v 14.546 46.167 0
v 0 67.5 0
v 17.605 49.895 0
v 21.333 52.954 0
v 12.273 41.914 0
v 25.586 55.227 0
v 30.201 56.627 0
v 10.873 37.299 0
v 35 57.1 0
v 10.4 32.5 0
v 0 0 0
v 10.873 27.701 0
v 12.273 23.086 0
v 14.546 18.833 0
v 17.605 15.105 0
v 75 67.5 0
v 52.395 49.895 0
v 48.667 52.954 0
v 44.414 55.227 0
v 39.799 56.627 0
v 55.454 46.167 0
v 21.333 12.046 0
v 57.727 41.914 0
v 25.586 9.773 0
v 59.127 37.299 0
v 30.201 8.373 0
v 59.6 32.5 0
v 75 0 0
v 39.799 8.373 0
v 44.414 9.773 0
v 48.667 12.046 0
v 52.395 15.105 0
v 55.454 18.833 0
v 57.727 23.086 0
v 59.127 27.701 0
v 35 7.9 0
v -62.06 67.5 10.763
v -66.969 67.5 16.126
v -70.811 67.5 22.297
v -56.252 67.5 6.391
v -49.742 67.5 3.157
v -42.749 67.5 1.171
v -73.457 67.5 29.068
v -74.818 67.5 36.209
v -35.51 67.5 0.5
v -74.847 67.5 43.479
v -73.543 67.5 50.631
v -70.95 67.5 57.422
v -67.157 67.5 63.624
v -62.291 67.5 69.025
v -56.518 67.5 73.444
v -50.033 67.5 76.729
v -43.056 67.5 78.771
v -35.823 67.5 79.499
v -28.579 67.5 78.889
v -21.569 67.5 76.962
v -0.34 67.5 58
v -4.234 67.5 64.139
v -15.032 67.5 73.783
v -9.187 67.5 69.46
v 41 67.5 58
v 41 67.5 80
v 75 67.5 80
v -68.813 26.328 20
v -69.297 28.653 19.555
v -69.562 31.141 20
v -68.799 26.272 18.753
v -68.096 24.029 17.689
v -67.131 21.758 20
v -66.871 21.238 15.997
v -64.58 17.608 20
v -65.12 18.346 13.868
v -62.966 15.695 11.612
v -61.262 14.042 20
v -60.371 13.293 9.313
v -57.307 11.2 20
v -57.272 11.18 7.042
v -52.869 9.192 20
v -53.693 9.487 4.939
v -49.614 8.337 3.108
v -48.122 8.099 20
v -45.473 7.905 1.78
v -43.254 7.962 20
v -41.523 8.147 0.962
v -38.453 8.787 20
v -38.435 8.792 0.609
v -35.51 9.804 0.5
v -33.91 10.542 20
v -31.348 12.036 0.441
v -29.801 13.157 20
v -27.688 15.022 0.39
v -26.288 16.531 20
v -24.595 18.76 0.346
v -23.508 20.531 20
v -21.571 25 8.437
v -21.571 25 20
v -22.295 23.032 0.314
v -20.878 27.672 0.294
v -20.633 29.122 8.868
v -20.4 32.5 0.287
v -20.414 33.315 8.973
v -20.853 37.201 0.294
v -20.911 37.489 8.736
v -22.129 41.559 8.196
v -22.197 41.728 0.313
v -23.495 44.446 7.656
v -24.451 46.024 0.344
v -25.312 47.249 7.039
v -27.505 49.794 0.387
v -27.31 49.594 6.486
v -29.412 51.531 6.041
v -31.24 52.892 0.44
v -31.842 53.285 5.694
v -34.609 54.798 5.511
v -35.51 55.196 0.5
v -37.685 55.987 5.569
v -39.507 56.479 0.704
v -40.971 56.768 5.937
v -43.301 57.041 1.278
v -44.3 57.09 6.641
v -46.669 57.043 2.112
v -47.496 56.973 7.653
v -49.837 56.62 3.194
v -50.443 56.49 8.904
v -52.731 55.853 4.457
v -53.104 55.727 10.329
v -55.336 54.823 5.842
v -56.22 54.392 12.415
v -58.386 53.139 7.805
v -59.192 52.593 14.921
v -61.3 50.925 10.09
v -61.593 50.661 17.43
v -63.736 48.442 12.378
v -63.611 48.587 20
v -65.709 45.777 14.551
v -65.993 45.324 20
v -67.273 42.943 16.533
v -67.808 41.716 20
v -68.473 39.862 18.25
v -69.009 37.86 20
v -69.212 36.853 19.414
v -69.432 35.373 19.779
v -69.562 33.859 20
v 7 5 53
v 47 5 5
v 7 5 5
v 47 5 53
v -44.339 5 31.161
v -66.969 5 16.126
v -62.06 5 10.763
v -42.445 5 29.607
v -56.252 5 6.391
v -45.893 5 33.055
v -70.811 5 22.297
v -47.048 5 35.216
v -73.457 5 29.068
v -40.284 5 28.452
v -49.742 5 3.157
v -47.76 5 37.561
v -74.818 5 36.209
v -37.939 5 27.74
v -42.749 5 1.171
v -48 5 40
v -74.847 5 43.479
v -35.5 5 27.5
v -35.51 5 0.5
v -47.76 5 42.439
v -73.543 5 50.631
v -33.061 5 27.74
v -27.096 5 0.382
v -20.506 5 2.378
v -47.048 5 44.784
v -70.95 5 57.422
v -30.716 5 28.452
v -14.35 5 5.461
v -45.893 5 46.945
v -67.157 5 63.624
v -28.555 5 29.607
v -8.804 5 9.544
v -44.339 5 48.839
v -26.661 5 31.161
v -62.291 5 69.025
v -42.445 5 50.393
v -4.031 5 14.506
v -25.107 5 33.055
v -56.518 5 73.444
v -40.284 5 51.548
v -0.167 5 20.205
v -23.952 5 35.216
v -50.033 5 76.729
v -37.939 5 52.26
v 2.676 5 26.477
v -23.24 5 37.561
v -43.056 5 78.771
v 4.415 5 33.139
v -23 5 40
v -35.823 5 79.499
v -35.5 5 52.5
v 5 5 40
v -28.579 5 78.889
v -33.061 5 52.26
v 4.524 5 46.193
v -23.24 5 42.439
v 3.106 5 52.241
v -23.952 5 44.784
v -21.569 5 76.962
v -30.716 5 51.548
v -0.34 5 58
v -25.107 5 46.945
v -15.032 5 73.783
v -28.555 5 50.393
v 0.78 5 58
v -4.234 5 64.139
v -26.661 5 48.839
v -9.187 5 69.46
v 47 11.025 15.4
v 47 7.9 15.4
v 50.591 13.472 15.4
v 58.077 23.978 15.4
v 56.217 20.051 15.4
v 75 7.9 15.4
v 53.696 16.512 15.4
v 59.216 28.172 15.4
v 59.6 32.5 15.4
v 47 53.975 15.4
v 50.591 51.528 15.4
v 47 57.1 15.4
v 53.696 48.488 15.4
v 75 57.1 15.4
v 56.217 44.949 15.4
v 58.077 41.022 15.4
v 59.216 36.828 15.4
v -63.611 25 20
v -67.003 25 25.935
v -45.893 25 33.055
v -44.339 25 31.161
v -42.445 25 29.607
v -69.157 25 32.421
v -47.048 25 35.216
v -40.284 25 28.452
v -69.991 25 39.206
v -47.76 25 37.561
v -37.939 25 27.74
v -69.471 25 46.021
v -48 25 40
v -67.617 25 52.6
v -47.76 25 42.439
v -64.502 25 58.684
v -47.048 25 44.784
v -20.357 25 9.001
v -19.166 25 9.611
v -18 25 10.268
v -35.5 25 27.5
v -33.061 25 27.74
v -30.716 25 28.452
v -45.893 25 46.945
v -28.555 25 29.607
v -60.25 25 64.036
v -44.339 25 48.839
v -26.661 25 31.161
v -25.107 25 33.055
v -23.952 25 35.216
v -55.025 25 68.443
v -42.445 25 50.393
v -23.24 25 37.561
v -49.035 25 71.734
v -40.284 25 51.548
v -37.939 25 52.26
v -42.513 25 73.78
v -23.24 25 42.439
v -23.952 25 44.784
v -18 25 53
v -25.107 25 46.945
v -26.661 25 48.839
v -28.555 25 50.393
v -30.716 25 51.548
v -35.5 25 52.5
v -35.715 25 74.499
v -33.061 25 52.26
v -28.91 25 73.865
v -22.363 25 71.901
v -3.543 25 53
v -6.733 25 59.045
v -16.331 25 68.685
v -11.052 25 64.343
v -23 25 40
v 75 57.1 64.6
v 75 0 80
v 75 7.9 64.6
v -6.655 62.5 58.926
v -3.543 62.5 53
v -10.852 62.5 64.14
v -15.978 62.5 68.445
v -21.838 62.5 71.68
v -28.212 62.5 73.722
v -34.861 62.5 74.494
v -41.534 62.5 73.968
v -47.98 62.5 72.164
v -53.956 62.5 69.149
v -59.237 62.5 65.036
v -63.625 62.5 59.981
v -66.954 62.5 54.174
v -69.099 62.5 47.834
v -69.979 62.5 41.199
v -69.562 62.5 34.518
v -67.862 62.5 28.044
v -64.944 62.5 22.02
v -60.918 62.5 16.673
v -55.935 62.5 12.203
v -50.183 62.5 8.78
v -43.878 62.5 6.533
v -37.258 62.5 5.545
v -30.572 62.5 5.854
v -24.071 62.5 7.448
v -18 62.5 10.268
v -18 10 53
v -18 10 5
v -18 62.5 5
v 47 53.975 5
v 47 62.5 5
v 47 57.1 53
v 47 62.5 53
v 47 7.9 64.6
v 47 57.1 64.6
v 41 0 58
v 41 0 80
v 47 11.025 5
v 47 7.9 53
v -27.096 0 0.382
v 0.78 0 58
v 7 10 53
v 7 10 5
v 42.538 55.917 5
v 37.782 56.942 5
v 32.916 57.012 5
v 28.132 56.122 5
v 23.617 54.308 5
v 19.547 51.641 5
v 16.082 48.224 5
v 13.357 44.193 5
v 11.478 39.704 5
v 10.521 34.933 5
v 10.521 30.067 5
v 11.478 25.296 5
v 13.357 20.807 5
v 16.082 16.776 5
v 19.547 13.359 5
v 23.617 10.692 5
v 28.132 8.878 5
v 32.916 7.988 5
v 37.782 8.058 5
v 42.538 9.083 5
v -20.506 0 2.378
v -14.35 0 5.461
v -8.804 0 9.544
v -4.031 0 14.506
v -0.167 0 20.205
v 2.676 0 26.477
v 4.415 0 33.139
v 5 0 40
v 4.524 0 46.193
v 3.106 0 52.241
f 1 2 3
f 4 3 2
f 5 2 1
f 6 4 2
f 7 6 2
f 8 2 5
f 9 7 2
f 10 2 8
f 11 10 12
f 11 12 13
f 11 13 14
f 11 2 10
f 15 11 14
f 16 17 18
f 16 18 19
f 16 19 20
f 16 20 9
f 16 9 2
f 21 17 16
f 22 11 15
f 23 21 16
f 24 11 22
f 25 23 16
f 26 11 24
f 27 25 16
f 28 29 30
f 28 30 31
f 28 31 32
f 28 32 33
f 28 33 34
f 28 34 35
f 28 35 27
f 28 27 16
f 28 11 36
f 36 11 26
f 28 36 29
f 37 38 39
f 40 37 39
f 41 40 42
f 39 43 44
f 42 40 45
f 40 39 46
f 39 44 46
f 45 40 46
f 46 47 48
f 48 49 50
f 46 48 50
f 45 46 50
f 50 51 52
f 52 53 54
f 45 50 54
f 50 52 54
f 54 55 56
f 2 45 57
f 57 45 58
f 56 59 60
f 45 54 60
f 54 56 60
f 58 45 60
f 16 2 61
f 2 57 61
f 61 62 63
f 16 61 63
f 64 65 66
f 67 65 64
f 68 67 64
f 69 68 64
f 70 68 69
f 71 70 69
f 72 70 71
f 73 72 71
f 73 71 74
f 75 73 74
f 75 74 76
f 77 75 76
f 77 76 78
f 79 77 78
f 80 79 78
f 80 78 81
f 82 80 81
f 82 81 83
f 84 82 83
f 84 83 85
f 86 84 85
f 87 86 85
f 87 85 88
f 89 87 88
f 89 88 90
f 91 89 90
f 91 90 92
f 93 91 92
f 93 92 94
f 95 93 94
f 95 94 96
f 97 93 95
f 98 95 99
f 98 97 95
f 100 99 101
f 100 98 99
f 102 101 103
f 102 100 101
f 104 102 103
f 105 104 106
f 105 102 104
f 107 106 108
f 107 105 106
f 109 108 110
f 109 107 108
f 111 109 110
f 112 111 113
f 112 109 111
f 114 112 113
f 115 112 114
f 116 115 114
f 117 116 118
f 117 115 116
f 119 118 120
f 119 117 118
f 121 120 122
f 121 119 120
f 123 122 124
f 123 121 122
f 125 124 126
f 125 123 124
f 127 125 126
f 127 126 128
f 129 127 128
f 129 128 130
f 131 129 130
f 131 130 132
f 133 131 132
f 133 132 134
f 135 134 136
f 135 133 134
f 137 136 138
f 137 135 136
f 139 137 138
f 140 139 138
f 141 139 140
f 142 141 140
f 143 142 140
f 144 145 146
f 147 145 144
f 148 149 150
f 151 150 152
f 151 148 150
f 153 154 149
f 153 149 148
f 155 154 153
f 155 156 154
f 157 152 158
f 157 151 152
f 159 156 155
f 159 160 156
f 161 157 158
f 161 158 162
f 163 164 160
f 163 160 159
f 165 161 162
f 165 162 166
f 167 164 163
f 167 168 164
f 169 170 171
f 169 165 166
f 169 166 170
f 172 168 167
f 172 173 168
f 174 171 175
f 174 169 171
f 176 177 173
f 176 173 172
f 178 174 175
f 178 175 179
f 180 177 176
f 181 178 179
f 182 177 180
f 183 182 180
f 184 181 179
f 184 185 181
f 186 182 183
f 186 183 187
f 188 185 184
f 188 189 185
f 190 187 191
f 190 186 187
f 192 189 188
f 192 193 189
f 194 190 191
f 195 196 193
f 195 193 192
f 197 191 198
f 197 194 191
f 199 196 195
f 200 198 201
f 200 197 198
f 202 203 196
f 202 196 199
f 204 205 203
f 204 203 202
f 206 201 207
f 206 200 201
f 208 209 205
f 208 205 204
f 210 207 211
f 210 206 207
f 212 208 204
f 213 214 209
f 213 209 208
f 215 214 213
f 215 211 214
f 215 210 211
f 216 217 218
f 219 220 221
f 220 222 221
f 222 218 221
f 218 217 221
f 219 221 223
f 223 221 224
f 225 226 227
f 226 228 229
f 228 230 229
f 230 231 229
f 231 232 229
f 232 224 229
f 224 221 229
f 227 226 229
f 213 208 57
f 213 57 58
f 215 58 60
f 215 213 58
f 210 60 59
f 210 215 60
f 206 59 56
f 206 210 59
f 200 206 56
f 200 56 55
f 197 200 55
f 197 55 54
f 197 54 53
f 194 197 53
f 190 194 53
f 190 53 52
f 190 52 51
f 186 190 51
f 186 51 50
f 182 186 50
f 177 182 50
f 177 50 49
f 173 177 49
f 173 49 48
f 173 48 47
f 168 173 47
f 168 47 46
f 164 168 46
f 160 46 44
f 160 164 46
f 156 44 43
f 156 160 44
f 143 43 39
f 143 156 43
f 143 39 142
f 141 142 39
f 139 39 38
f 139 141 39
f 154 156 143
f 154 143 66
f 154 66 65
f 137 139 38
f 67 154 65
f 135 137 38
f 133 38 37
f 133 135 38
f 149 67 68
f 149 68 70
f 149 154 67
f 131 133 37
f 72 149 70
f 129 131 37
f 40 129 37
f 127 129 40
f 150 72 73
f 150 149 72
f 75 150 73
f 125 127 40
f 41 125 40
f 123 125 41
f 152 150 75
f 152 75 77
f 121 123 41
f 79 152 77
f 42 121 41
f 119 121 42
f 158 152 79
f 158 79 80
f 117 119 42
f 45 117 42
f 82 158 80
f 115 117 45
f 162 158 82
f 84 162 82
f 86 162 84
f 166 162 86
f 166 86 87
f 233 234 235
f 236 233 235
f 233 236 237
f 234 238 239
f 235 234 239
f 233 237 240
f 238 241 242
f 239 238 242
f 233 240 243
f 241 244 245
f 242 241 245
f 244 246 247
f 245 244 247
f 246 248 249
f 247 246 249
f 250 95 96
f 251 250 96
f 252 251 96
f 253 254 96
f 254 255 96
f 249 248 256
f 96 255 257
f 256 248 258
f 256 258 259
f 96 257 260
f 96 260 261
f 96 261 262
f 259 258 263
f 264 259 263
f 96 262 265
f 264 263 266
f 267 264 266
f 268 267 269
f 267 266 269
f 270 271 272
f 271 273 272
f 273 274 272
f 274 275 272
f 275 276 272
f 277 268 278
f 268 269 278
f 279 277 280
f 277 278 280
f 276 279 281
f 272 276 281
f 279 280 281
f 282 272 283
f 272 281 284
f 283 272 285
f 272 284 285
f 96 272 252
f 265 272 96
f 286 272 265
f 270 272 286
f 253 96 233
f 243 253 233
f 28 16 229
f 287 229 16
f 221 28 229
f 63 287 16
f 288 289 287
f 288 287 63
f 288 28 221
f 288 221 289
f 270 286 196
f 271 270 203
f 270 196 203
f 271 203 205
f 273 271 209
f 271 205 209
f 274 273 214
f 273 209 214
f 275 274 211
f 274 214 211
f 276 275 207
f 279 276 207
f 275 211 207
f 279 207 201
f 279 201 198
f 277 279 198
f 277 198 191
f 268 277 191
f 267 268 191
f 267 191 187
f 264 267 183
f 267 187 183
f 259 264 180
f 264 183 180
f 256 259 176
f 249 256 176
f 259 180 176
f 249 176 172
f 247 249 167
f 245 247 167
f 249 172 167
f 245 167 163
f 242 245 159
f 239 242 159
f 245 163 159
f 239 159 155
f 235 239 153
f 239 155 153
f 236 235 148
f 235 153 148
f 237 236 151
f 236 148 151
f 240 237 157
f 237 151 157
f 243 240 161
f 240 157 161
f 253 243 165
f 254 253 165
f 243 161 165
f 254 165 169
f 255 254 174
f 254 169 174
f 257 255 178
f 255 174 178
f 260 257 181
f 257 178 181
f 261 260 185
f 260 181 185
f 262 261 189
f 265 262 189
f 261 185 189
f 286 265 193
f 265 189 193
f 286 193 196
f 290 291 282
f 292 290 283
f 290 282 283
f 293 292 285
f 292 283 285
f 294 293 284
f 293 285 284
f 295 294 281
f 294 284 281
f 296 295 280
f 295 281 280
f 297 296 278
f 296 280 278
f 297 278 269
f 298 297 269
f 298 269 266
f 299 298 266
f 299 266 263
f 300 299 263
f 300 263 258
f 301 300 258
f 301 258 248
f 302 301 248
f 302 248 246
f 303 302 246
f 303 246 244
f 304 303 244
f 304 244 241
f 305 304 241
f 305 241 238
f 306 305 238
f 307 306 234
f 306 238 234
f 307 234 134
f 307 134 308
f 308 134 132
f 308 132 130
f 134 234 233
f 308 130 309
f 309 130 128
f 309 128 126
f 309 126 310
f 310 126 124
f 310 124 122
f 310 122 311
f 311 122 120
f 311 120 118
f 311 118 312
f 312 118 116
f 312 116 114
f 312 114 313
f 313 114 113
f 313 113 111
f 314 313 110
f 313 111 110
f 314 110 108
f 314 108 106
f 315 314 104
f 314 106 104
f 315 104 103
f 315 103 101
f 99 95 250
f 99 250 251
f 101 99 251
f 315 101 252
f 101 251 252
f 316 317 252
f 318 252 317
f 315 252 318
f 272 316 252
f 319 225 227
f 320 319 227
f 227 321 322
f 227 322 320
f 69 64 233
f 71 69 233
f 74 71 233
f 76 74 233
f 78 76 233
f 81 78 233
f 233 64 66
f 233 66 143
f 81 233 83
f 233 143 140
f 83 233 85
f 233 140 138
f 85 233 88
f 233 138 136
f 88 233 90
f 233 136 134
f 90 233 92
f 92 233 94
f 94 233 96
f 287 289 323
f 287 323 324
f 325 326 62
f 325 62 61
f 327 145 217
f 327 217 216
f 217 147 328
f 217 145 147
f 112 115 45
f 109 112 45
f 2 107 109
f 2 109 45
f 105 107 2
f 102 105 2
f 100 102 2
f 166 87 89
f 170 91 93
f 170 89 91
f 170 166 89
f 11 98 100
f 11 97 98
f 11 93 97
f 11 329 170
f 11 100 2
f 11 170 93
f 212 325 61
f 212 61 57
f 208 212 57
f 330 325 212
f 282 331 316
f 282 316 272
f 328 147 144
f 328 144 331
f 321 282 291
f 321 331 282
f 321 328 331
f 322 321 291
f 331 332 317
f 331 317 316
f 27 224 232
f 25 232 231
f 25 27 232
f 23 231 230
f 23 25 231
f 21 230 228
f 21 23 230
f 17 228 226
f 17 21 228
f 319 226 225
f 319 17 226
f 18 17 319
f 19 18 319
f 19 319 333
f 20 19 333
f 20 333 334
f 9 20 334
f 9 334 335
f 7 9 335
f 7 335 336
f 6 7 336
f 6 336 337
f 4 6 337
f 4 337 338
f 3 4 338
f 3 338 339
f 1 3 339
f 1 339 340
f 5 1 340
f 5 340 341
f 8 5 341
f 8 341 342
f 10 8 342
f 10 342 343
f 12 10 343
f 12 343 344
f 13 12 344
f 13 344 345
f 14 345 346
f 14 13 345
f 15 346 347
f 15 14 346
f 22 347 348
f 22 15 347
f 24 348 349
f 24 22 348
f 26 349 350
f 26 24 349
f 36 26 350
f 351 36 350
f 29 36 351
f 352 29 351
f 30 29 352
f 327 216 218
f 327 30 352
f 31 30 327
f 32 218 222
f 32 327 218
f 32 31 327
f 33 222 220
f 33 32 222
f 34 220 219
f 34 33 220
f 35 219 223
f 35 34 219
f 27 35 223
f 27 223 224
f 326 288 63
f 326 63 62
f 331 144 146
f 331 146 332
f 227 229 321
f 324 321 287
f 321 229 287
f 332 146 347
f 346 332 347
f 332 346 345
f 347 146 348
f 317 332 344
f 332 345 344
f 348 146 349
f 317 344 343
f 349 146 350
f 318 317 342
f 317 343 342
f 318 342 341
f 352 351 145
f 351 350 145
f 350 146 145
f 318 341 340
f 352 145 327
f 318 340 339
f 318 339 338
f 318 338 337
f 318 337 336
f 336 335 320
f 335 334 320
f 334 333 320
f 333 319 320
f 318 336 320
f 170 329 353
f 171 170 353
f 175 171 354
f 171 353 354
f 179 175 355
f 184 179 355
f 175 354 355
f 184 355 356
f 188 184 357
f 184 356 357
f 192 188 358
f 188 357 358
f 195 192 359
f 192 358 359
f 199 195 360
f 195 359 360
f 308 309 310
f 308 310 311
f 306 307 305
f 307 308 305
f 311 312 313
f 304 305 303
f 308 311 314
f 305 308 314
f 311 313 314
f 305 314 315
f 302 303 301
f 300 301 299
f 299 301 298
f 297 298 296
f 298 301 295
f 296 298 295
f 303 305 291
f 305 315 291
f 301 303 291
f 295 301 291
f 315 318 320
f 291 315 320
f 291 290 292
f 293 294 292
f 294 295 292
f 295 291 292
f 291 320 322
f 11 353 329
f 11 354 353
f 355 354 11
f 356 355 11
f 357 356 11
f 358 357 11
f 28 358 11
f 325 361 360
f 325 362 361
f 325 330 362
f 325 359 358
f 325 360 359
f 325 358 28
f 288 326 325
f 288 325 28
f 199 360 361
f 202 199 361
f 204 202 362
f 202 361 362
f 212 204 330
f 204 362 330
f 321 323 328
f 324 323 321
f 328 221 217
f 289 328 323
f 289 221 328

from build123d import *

# Parameters (mm, degrees)
F1_DEPTH  = 67.5
F3_W      = 49.2
F3_H      = 49.2
F4_DEPTH  = 28
F6_W      = 57.5
F6_H      = 48
F7_DEPTH  = 40
F9_DEPTH  = 5
F10_R     = 12.5
F11_DEPTH = 20
F13_R     = 34.5
F14_DEPTH = 37.5
F16_W     = 52.5
F16_H     = 48
F17_DEPTH = 25
F18_R     = 24.6
F19_DEPTH = 20


with BuildPart() as f1:
    # F0 (on Front) → F1 (new body)
    with BuildSketch(Plane.XZ):
        with BuildLine():
            ThreePointArc((-35.5098846553, 0.5000012368), (-7.5727771152, 12.0657876083), (4, 40))
            ThreePointArc((4, 40), (2.8997637092, 49.2578694674), (-0.3396530165, 58))
            ThreePointArc((-0.3396530165, 58), (-69.1964570083, 60.6106473718), (-35.5098846553, 0.5000012368))
        make_face()
        with BuildLine():
            ThreePointArc((-0.3396530165, 58), (2.8997637092, 49.2578694674), (4, 40))
            ThreePointArc((4, 40), (-7.5727771152, 12.0657876083), (-35.5098846553, 0.5000012368))
            Line((-35.5098846553, 0.5000012368), (0, 0))
            Line((0, 0), (75, 0))
            Line((75, 0), (75, 80))
            Line((75, 80), (41, 80))
            Line((41, 80), (41, 58))
            Line((41, 58), (-0.3396530165, 58))
        make_face()
    extrude(amount=-F1_DEPTH)

    # F3 (on offset) → F4 (cut)
    with BuildSketch(Plane.YZ.offset(75)):
        with Locations((32.5, 40)):
            Rectangle(F3_W, F3_H)
    extrude(amount=-F4_DEPTH, mode=Mode.SUBTRACT)

    # F6 (on offset) → F7 (cut)
    with BuildSketch(Plane.YZ.offset(47)):
        with Locations((33.75, 29)):
            Rectangle(F6_W, F6_H)
    extrude(amount=-F7_DEPTH, mode=Mode.SUBTRACT)

    # F8 (on face) → F9 (cut)
    with BuildSketch(Plane.XZ):
        with BuildLine():
            ThreePointArc((-27.0960278356, 0.3815289056), (-4.0308812273, 14.5059896511), (5, 40))
            ThreePointArc((5, 40), (3.9309299575, 49.2440122613), (0.7801598673, 58))
            Line((0.7801598673, 58), (-0.3396530165, 58))
            ThreePointArc((-0.3396530165, 58), (-69.1964570083, 60.6106473718), (-35.5098846553, 0.5000012368))
            Line((-35.5098846553, 0.5000012368), (-27.0960278356, 0.3815289056))
        make_face()
    extrude(amount=-F9_DEPTH, mode=Mode.SUBTRACT)

    # F10 (on face) → F11 (cut)
    with BuildSketch(Plane.XZ.offset(-5)):
        with Locations((-35.5, 40)):
            Circle(F10_R)
    extrude(amount=-F11_DEPTH, mode=Mode.SUBTRACT)

    # F13 (on offset) → F14 (cut)
    with BuildSketch(Plane.XZ.offset(-25)):
        with Locations((-35.5, 40)):
            Circle(F13_R)
    extrude(amount=-F14_DEPTH, mode=Mode.SUBTRACT)

    # F16 (on offset) → F17 (cut)
    with BuildSketch(Plane.YZ.offset(7)):
        with Locations((36.25, 29)):
            Rectangle(F16_W, F16_H)
    extrude(amount=-F17_DEPTH, mode=Mode.SUBTRACT)

    # F18 (on Top) → F19 (cut)
    with BuildSketch(Plane.XY):
        with Locations((-45, 32.5)):
            Circle(F18_R)
        with Locations((35, 32.5)):
            Circle(F18_R)
    extrude(amount=F19_DEPTH, mode=Mode.SUBTRACT)


solid = f1.part
